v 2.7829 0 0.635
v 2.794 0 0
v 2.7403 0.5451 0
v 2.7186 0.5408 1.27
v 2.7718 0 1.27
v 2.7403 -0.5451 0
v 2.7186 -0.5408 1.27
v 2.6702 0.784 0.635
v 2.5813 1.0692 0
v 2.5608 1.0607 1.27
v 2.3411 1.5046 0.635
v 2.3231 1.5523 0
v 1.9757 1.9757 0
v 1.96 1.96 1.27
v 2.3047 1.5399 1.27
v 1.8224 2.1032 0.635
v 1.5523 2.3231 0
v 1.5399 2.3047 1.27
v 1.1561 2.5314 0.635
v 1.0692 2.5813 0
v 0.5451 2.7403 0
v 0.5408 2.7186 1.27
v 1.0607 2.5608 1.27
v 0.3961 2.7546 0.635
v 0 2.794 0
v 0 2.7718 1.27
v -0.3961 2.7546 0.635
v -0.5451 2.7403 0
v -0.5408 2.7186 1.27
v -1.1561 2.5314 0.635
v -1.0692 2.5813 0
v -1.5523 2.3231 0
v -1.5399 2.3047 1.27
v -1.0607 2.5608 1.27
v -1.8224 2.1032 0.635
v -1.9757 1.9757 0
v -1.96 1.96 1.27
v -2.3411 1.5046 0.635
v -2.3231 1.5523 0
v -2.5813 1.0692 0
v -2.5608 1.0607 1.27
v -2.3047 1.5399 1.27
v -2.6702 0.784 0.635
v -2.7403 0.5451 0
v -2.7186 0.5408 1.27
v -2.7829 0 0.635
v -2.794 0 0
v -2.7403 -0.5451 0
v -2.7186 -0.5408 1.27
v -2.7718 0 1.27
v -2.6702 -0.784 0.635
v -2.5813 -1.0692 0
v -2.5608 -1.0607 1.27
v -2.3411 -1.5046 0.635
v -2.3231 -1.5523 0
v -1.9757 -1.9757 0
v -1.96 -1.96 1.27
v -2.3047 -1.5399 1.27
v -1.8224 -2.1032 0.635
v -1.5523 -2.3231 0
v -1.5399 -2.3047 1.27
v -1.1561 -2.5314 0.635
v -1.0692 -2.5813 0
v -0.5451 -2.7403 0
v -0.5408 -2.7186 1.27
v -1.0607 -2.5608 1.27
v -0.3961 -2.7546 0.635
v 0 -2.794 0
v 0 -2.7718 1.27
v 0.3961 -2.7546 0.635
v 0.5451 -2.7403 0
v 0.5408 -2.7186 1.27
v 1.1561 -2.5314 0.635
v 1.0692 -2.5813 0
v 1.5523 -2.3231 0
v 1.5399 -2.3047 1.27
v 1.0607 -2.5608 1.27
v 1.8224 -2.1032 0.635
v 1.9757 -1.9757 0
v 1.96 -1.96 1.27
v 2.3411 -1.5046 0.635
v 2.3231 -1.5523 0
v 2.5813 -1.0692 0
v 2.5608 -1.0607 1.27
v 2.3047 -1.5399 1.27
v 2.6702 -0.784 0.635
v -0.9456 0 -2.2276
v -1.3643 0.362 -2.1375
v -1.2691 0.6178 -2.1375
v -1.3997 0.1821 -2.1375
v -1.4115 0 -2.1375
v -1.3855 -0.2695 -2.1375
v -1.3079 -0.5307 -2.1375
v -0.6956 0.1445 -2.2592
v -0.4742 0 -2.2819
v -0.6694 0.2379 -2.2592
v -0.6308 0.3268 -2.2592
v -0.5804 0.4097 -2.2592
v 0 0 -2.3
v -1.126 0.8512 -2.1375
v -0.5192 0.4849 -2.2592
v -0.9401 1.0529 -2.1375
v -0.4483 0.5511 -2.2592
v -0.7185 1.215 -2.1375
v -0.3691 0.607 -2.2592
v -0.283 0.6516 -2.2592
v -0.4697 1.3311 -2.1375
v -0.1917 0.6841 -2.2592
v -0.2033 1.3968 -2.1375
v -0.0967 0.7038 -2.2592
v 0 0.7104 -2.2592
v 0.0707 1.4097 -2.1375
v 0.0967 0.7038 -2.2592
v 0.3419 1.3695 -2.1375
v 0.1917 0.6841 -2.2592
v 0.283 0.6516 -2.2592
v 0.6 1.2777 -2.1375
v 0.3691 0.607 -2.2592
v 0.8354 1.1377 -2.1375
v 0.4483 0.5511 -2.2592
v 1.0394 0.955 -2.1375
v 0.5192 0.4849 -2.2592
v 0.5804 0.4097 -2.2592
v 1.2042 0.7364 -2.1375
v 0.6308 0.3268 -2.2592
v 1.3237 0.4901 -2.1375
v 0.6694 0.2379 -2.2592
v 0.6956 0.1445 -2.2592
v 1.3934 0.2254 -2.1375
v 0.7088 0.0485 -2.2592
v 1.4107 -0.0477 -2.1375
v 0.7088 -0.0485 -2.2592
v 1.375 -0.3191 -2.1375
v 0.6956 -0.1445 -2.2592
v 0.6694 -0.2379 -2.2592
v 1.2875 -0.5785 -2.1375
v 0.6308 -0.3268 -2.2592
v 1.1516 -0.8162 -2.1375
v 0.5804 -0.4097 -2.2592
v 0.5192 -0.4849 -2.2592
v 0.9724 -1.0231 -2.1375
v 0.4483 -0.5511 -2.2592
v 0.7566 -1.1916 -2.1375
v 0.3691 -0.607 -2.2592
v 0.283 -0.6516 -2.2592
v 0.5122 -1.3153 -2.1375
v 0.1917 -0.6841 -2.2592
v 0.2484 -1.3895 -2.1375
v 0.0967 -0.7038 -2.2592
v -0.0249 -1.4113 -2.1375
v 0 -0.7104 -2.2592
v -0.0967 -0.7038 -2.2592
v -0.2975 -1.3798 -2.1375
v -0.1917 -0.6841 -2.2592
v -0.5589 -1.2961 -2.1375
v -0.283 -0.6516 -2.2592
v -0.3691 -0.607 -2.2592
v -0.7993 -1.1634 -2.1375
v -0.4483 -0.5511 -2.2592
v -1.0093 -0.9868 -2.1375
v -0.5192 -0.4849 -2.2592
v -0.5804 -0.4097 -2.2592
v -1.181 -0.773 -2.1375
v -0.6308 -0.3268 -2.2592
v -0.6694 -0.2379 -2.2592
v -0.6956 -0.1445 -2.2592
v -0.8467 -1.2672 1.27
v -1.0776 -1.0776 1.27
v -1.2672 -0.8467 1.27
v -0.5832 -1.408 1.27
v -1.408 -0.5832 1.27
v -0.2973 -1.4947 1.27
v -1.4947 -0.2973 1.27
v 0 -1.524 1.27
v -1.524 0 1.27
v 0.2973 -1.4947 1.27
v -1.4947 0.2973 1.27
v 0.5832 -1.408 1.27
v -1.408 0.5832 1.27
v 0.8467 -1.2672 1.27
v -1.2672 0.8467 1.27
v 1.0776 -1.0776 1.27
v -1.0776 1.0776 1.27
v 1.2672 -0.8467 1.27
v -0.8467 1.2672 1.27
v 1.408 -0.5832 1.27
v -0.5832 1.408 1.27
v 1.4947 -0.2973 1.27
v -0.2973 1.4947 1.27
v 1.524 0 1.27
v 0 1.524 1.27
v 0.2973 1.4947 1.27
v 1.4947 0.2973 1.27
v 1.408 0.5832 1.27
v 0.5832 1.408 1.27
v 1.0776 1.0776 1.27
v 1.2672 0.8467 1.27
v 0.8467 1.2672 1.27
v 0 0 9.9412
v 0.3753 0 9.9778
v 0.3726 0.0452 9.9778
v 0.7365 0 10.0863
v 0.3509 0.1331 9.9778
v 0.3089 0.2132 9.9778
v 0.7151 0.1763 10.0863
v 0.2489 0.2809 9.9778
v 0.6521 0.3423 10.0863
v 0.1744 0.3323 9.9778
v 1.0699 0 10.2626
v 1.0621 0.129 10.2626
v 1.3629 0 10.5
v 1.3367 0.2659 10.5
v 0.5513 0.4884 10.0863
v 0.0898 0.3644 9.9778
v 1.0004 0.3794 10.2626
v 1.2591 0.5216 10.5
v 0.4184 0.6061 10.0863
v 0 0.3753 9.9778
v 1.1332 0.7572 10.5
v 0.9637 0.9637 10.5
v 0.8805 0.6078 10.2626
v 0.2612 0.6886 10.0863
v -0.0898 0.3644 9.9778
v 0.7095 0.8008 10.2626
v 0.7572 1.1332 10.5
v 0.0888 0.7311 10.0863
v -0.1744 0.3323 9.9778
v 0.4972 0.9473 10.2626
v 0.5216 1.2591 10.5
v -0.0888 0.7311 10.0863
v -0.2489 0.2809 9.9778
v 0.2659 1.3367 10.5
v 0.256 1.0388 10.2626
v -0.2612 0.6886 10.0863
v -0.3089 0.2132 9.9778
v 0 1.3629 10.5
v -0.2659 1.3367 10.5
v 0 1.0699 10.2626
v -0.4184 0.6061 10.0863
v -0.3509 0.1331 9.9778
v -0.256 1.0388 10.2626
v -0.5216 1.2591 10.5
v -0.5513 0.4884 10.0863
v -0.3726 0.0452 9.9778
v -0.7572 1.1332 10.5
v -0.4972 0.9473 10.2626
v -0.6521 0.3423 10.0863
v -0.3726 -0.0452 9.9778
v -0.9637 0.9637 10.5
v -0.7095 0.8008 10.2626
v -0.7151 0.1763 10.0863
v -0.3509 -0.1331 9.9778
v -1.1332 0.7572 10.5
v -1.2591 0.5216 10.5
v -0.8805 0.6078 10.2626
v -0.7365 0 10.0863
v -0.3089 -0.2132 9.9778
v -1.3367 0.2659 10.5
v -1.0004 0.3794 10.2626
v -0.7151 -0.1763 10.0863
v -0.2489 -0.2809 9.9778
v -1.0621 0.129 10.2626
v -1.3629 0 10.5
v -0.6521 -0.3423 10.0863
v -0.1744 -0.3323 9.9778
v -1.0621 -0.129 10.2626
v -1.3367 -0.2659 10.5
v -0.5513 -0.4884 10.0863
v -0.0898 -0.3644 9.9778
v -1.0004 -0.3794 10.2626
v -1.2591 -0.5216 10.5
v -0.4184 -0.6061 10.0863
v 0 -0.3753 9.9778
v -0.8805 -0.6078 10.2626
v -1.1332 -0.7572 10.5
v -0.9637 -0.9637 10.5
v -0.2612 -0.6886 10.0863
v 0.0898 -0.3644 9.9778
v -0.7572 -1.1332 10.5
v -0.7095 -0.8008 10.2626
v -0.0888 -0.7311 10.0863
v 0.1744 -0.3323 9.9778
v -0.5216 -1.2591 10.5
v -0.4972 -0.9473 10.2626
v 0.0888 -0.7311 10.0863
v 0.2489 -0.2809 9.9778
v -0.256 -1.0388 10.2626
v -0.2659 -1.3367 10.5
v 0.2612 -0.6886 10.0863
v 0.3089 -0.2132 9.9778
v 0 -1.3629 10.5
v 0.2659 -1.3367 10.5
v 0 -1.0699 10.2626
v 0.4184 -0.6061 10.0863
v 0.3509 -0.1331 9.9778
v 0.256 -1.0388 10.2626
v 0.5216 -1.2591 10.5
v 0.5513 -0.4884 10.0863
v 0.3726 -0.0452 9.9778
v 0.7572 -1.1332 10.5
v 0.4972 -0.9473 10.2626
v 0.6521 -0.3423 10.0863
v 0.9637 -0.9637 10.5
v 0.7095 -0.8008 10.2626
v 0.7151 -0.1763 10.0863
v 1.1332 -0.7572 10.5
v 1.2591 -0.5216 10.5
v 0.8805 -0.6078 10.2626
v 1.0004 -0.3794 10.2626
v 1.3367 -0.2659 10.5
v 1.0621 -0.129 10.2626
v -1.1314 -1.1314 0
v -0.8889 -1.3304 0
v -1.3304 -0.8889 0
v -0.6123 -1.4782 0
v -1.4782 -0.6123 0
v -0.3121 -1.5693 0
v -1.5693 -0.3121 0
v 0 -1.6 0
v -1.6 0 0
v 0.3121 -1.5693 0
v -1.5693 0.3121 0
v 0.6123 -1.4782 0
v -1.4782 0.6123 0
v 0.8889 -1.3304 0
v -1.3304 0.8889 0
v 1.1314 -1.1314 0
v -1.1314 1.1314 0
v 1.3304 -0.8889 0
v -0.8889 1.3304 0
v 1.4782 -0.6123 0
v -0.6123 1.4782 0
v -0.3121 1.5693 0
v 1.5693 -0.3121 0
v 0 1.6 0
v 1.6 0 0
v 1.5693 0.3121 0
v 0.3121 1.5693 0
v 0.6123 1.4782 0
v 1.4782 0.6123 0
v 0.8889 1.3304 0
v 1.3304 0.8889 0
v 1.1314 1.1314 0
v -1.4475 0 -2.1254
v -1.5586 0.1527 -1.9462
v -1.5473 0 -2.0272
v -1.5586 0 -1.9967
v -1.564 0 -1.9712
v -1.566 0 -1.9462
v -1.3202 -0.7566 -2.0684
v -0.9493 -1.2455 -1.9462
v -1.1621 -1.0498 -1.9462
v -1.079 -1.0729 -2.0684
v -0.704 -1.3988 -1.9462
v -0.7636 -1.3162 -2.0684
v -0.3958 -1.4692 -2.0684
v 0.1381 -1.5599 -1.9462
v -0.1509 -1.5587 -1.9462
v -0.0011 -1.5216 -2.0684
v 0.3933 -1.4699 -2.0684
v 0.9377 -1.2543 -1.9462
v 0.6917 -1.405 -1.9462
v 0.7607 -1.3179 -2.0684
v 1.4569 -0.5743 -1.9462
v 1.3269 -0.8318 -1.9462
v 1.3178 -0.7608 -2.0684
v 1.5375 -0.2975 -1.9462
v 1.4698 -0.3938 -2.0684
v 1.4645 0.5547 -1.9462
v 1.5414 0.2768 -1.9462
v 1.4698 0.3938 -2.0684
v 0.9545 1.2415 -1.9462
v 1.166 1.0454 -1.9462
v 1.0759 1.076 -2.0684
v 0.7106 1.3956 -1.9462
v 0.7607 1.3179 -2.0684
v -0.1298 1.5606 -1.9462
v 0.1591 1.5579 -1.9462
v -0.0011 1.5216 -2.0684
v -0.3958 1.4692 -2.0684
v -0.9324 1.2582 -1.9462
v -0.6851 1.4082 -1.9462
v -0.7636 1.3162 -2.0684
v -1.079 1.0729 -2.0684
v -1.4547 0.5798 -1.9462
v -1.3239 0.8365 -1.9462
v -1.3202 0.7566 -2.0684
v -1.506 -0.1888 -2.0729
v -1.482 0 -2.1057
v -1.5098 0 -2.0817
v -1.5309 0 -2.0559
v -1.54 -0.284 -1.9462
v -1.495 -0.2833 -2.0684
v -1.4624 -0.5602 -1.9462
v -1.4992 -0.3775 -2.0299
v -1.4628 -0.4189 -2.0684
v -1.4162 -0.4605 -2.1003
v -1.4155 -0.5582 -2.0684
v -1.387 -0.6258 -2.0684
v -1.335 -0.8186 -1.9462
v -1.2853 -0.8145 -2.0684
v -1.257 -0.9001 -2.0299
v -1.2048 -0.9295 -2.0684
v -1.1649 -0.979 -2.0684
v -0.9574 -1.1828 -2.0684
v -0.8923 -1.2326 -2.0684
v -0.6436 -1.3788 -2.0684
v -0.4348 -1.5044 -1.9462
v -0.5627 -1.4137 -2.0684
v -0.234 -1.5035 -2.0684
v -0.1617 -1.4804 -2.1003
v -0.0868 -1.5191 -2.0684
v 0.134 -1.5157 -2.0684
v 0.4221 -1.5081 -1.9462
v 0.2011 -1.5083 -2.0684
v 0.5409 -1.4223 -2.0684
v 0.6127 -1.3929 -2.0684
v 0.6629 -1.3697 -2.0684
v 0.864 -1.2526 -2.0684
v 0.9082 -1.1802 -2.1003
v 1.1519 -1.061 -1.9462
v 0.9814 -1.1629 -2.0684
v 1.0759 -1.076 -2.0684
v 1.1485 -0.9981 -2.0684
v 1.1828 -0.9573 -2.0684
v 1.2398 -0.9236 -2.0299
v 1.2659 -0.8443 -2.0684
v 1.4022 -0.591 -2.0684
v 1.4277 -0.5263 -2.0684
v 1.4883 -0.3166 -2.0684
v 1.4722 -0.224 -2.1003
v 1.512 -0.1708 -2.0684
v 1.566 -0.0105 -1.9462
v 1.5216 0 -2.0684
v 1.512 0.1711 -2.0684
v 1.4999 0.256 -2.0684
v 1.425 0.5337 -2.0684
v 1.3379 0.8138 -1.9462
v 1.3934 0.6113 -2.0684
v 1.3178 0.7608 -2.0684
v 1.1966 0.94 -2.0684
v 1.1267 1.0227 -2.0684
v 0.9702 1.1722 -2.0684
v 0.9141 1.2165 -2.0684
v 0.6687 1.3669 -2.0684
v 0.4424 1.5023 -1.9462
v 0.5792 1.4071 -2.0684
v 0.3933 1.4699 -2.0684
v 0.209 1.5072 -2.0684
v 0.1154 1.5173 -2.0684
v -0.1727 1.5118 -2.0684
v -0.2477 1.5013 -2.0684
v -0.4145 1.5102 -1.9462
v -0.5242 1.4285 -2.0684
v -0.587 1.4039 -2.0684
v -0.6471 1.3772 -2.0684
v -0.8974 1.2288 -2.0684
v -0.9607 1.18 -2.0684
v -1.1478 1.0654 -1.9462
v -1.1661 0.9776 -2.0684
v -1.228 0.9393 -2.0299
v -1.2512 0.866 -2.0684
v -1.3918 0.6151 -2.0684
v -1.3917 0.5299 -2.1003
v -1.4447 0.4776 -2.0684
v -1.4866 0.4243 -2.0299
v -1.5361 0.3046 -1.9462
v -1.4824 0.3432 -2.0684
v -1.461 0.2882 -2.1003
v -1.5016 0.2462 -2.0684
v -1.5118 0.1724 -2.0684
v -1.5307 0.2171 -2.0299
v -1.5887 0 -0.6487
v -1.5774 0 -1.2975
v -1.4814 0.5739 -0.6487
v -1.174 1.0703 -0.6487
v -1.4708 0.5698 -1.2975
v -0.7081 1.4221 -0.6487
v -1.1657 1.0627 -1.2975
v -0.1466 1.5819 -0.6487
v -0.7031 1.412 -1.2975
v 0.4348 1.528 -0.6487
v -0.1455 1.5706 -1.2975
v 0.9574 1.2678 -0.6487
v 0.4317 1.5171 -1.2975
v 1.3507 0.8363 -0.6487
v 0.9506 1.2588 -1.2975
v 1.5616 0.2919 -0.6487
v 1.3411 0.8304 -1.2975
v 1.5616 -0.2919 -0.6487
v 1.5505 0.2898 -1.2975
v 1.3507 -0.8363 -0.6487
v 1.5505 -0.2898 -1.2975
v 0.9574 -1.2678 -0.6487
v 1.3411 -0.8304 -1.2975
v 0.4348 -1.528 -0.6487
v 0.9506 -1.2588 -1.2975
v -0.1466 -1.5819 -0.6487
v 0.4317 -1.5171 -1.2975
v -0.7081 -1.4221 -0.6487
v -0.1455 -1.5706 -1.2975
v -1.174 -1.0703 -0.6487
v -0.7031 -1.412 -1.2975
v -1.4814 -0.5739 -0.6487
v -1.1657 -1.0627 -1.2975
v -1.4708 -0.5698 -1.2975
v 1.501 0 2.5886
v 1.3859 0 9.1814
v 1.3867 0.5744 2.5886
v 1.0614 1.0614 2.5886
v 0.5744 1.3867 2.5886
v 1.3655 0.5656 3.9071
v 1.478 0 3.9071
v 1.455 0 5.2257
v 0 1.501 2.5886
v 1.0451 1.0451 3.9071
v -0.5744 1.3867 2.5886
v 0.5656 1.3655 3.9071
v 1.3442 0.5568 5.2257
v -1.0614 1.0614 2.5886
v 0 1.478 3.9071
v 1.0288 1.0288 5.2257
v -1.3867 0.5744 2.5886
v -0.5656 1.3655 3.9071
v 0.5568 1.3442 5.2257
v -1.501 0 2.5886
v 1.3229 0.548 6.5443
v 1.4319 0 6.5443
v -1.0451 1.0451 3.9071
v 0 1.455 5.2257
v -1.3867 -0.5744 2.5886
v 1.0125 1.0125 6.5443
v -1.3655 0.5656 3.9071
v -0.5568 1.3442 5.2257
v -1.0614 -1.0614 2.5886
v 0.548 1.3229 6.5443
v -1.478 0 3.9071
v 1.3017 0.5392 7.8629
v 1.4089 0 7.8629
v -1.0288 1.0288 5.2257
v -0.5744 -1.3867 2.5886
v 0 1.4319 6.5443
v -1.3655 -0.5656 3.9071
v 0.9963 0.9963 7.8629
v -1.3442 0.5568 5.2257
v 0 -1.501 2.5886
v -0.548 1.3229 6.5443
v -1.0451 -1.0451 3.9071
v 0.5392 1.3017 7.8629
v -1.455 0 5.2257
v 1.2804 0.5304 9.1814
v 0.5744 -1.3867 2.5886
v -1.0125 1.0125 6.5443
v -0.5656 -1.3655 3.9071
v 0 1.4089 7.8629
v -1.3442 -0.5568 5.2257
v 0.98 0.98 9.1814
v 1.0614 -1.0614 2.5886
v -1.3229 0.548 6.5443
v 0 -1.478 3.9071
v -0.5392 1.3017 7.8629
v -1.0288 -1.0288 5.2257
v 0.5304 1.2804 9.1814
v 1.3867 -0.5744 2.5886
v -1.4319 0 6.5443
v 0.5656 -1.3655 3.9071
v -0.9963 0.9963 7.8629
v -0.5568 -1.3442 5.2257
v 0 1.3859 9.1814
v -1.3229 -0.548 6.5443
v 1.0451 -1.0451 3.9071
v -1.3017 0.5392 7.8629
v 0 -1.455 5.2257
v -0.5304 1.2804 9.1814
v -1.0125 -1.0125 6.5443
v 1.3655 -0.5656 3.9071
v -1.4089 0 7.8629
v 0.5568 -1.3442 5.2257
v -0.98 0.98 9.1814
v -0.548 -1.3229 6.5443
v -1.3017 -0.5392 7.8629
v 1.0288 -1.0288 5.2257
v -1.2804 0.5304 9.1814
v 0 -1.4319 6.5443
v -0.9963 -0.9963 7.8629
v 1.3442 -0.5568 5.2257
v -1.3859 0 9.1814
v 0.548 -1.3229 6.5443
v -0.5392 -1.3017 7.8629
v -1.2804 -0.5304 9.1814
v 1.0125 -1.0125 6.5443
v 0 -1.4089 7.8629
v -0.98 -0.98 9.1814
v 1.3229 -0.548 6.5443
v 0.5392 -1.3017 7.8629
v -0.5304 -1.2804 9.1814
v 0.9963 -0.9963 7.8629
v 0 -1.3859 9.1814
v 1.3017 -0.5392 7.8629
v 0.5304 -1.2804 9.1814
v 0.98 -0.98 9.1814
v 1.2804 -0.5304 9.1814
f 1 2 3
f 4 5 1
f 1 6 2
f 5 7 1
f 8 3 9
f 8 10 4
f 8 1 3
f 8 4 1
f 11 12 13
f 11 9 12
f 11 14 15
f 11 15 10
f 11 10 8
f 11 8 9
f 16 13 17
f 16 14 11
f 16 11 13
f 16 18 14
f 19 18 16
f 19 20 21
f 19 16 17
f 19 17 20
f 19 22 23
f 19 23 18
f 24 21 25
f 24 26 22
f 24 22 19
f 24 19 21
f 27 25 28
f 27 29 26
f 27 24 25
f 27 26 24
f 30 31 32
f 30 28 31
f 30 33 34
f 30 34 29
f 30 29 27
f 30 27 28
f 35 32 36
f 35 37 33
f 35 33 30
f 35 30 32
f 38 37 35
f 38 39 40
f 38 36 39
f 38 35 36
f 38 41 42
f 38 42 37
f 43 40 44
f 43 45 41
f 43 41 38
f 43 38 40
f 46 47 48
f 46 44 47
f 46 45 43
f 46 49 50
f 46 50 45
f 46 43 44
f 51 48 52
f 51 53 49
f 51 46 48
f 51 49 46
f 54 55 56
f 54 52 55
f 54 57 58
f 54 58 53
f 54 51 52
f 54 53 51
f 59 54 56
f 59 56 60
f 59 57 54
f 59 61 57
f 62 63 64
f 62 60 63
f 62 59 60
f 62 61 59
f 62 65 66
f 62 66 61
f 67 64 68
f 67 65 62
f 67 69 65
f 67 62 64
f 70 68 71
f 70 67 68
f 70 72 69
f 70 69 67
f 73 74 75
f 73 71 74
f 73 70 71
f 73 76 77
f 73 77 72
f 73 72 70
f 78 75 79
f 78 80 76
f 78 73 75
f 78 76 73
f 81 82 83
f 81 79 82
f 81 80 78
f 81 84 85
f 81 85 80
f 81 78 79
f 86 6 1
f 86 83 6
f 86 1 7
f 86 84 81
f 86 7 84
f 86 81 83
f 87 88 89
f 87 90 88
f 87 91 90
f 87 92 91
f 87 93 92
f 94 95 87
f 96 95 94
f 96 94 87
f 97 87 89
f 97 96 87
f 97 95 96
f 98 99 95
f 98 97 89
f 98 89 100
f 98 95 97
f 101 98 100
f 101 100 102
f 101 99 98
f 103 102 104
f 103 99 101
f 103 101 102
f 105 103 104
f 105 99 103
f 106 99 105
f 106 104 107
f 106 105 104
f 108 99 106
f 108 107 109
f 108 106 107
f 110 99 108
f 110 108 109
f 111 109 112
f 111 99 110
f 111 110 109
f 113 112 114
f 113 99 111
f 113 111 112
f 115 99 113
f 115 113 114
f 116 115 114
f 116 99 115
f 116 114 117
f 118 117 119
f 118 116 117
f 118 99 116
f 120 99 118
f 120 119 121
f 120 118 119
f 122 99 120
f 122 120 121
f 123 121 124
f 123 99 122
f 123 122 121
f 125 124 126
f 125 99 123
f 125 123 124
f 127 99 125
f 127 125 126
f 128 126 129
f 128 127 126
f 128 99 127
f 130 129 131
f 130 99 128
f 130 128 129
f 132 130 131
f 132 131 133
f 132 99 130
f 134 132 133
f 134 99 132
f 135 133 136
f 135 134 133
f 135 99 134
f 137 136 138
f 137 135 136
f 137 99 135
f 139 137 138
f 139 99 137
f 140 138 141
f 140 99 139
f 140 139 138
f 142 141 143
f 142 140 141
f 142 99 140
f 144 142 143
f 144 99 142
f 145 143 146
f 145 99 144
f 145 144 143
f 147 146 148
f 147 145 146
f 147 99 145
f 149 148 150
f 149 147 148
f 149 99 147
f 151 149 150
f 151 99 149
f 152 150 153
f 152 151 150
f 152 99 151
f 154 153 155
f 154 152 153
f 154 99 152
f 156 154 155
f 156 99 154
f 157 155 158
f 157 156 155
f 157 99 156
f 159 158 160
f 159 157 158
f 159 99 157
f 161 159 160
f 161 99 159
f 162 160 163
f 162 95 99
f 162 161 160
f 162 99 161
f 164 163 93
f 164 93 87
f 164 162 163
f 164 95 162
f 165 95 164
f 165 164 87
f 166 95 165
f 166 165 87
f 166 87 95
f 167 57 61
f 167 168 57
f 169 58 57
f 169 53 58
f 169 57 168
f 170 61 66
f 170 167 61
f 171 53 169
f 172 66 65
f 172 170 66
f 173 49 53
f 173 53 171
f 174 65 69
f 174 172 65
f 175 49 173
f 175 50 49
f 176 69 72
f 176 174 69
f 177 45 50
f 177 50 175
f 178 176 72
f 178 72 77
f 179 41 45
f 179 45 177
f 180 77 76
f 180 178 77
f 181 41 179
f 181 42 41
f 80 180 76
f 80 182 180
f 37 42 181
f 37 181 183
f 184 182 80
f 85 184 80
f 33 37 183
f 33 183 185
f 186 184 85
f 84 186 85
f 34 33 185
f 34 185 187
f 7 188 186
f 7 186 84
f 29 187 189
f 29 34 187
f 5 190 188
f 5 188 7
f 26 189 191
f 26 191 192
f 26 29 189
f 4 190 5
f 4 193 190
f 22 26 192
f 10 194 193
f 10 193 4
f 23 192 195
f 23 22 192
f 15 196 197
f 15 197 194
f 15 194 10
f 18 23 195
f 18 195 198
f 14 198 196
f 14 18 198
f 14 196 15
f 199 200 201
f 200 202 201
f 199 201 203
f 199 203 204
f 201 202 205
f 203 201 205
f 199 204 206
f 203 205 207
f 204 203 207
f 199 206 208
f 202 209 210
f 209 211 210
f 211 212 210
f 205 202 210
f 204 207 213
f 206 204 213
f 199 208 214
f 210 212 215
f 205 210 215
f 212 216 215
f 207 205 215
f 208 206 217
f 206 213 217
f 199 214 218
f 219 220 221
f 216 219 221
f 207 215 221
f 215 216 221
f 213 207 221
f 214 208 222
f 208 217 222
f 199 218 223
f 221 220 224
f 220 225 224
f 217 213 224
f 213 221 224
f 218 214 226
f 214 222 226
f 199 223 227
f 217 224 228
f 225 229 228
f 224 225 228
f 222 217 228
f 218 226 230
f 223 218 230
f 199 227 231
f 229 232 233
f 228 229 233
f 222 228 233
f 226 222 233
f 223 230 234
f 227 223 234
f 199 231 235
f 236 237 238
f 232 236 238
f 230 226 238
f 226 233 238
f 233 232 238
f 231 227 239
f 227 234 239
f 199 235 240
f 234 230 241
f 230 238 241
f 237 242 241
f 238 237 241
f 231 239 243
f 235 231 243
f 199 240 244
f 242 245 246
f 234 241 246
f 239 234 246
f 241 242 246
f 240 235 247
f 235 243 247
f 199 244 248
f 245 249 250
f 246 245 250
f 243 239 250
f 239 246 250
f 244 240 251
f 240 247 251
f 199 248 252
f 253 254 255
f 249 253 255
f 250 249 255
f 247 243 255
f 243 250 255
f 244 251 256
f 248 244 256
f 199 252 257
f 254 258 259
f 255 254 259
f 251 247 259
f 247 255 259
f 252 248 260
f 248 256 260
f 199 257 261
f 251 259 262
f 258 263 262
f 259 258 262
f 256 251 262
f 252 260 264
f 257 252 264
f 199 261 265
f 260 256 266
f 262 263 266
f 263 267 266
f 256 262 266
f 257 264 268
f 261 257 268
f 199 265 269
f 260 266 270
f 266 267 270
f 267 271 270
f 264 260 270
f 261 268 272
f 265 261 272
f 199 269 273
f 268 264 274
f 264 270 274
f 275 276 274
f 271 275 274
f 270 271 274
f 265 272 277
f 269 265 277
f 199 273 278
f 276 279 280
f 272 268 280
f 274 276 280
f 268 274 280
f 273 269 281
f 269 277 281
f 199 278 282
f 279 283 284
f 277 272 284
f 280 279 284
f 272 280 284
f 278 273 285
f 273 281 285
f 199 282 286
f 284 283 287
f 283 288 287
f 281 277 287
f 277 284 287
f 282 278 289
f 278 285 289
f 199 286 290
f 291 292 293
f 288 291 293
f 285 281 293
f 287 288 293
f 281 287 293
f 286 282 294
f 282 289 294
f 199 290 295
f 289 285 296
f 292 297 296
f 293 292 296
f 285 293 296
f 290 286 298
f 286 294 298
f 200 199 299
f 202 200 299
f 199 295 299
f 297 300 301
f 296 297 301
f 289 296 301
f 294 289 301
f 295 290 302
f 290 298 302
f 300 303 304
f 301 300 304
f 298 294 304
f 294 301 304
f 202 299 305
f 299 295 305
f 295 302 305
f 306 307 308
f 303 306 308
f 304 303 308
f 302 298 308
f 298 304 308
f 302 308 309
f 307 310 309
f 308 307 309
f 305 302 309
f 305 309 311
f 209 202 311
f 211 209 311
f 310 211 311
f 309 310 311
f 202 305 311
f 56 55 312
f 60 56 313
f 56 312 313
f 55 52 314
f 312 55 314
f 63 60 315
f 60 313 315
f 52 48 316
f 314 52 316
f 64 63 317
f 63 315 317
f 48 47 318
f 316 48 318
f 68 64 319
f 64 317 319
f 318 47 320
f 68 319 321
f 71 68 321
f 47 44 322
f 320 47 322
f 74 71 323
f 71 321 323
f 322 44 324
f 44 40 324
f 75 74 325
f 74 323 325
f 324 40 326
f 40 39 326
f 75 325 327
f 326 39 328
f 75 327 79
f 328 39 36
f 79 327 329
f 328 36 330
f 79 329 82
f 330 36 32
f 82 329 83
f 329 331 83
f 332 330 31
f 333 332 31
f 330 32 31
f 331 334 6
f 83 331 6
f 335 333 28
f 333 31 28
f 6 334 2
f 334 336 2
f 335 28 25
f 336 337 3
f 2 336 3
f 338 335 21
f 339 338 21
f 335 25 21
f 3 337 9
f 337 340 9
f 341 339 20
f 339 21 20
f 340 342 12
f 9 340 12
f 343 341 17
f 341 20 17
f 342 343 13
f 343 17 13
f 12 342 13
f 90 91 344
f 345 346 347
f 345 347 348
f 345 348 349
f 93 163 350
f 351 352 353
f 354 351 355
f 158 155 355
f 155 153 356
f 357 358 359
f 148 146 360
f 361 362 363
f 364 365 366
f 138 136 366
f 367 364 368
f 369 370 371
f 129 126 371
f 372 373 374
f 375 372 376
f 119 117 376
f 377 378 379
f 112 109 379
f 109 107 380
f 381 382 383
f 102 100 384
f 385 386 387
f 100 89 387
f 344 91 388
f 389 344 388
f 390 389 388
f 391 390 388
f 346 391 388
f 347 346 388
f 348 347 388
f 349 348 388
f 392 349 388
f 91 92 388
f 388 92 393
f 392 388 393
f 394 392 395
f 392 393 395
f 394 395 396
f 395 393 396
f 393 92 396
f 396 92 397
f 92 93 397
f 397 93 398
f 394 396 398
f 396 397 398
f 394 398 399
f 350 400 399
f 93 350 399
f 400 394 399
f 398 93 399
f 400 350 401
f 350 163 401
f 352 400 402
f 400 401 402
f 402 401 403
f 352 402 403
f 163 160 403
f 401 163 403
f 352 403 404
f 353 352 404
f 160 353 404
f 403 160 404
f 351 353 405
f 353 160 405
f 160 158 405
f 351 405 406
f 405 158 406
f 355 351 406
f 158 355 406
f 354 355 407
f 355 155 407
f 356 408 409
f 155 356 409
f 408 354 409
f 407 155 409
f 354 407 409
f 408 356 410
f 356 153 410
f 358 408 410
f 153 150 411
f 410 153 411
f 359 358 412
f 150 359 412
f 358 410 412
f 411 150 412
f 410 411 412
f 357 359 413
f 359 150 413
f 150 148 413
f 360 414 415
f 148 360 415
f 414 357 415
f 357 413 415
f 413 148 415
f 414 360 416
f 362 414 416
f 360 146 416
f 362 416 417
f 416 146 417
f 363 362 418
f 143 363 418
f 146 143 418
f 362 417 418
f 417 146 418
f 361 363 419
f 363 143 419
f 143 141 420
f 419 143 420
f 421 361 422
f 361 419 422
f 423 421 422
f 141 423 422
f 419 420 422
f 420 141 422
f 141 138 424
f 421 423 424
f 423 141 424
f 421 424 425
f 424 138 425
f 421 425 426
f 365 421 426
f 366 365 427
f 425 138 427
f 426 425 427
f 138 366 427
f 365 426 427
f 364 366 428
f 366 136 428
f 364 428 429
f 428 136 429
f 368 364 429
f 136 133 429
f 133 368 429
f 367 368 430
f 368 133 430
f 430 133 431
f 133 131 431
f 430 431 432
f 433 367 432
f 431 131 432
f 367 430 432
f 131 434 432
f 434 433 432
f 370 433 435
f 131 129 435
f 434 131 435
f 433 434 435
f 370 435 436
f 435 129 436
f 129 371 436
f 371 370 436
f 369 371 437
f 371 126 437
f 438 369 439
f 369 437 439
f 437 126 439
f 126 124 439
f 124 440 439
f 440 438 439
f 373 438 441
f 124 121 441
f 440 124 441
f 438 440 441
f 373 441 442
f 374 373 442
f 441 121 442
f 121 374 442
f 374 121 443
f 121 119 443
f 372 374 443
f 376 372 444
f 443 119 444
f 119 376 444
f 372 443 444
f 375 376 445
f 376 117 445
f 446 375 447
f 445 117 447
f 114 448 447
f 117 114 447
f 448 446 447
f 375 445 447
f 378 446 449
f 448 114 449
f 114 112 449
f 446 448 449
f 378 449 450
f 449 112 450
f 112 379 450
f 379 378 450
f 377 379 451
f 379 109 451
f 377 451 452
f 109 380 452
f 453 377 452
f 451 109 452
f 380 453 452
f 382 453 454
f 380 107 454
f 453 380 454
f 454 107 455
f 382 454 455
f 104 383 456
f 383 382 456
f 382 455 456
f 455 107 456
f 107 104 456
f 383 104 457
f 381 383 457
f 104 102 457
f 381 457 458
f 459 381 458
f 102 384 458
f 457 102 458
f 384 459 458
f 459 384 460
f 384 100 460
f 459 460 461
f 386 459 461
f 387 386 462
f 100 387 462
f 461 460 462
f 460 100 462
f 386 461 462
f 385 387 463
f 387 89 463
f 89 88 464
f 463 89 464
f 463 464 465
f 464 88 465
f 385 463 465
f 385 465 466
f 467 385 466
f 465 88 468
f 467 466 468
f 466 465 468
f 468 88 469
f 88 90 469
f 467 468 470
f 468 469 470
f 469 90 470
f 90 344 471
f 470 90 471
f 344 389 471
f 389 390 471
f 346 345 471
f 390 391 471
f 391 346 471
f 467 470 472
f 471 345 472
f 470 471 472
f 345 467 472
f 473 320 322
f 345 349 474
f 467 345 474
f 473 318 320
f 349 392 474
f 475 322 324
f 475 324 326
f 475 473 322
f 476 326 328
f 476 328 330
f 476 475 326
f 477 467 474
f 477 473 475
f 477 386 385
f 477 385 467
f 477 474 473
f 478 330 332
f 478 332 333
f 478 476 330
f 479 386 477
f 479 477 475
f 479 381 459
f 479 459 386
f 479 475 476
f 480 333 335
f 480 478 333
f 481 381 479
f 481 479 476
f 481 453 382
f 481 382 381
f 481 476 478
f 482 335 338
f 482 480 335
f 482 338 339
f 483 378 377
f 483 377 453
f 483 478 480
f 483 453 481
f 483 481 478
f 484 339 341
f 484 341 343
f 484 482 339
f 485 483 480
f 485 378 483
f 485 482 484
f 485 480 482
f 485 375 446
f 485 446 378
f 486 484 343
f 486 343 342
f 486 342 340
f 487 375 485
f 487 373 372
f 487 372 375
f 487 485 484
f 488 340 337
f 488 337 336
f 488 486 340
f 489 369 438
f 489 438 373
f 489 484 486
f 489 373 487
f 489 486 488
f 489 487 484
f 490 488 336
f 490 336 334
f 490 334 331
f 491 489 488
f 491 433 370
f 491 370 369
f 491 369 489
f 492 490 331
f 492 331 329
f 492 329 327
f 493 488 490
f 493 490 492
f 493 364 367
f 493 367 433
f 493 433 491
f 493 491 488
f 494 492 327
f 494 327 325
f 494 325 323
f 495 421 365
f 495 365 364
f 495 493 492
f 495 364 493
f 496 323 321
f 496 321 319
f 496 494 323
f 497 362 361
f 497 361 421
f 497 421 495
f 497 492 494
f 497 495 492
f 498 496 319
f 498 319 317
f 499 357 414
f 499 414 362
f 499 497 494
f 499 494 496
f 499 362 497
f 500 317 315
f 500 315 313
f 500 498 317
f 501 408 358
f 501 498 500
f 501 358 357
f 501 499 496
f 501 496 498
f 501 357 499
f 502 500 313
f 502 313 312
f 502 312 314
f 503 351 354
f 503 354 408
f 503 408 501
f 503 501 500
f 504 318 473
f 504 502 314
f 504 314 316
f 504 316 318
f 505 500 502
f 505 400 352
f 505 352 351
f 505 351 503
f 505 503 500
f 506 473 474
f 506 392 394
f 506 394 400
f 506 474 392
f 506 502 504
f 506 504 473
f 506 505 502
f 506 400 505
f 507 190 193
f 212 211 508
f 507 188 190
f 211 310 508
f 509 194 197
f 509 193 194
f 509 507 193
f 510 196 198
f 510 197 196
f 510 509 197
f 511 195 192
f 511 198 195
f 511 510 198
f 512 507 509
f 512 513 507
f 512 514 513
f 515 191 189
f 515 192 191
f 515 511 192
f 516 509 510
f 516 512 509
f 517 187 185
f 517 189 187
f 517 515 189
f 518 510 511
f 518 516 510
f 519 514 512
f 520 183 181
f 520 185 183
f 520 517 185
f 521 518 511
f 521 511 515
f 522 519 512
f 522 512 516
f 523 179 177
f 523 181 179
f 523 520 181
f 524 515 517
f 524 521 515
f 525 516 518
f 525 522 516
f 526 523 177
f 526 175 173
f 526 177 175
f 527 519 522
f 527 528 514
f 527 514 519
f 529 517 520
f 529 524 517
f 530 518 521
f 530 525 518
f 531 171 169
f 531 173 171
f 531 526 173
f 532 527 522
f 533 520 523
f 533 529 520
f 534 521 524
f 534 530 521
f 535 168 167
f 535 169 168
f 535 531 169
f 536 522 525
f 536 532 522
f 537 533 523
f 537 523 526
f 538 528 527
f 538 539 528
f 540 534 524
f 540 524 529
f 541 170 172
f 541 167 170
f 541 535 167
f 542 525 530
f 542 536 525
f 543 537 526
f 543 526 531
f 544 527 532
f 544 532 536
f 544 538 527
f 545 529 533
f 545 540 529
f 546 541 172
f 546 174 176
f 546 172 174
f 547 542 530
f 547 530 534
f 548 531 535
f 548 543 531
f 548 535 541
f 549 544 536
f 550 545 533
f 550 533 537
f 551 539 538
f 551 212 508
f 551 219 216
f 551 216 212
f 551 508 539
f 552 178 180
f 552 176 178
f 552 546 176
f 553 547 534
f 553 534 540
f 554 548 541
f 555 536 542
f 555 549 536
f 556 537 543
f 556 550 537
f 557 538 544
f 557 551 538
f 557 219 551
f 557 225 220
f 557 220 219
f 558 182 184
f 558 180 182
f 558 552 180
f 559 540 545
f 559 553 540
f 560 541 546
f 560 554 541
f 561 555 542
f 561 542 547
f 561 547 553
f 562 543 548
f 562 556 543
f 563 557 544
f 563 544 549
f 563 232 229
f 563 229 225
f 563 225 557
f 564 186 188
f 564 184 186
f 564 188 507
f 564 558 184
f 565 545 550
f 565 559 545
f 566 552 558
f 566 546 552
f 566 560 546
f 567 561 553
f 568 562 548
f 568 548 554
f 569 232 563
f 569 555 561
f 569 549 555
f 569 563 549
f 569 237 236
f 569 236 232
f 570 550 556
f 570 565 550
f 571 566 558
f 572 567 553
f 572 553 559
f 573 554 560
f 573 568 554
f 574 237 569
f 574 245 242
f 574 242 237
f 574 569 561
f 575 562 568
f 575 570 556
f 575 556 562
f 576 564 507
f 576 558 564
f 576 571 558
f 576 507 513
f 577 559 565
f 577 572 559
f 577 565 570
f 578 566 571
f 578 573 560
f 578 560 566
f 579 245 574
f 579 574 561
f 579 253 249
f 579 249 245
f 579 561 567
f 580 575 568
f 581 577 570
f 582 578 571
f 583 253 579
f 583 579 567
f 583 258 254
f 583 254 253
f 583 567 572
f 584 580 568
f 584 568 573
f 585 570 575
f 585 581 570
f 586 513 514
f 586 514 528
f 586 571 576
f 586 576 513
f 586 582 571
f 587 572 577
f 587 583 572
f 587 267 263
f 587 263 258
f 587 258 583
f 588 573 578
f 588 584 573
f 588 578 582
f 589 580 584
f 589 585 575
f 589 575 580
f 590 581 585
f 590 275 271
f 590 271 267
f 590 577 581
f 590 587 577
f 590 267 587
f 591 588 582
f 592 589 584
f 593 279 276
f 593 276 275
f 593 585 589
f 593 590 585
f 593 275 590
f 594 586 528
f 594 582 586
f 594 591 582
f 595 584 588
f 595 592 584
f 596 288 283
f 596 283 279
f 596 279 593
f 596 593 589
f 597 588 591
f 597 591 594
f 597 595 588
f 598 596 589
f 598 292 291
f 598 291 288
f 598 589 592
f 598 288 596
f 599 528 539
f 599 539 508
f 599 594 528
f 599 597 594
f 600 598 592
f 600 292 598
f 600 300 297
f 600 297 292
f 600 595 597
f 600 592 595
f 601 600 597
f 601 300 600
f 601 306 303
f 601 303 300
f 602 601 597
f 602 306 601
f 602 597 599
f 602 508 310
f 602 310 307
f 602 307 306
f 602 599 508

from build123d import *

# Parameters (mm, degrees)
SKETCH1_R           = 2.794
BOSS_EXTRUDE1_DEPTH = 1.27
BOSS_EXTRUDE1_TAPER = 1
SKETCH2_R           = 1.524
BOSS_EXTRUDE2_DEPTH = 9.23000005
BOSS_EXTRUDE2_TAPER = 1
SKETCH3_R           = 1.6
BOSS_EXTRUDE3_DEPTH = 2.1
BOSS_EXTRUDE3_TAPER = 1
FILLET1_R           = 0.2


with BuildPart() as part:
    # Sketch1 → Boss-Extrude1 (new body)
    with BuildSketch(Plane.XY):
        Circle(SKETCH1_R)
    extrude(amount=BOSS_EXTRUDE1_DEPTH, taper=BOSS_EXTRUDE1_TAPER)

    # Sketch2 → Boss-Extrude2 (add)
    with BuildSketch(Plane.XY.offset(1.27)):
        Circle(SKETCH2_R)
    extrude(amount=BOSS_EXTRUDE2_DEPTH, taper=BOSS_EXTRUDE2_TAPER)

    # Sketch3 → Boss-Extrude3 (add)
    with BuildSketch(Plane(origin=(0, 0, 0), x_dir=(-1, 0, 0), z_dir=(0, 0, -1))):
        Circle(SKETCH3_R)
    extrude(amount=BOSS_EXTRUDE3_DEPTH, taper=BOSS_EXTRUDE3_TAPER)

    # Sketch5 → Cut-Revolve4 (revolve, cut)
    with BuildSketch(Plane(origin=(0, 0, 0), x_dir=(1, 0, 0), z_dir=(0, 1, 0))):
        with BuildLine():
            Line((0, -10.50000005), (0, -9.94120005))
            ThreePointArc((0, -9.94120005), (0.736499476, -10.086324189), (1.36288975, -10.50000005))
            Line((1.36288975, -10.50000005), (1.36288975, -10.823922581))
            Line((1.36288975, -10.823922581), (0, -10.823922581))
            Line((0, -10.823922581), (0, -10.50000005))
        make_face()
    revolve(axis=Axis((0, 0, 1.27), (0, 0, 1)), mode=Mode.SUBTRACT)

    # Sketch6 → Revolve1 (revolve)
    with BuildSketch(Plane(origin=(0, 0, 0), x_dir=(1, 0, 0), z_dir=(0, 1, 0))):
        with BuildLine():
            Line((0, 2.3), (0, 2.1))
            Line((0, 2.1), (-1.563344364, 2.1))
            ThreePointArc((-1.563344364, 2.1), (-0.788042765, 2.249797078), (0, 2.3))
        make_face()
    revolve(axis=Axis((0, 0, -2.1), (0, 0, -1)))

    # Fillet1
    fillet1_edges = [part.edges().sort_by_distance(p)[0] for p in [
        (1.563344364, 0, -2.1),
    ]]
    fillet(fillet1_edges, radius=FILLET1_R)


solid = part.part
